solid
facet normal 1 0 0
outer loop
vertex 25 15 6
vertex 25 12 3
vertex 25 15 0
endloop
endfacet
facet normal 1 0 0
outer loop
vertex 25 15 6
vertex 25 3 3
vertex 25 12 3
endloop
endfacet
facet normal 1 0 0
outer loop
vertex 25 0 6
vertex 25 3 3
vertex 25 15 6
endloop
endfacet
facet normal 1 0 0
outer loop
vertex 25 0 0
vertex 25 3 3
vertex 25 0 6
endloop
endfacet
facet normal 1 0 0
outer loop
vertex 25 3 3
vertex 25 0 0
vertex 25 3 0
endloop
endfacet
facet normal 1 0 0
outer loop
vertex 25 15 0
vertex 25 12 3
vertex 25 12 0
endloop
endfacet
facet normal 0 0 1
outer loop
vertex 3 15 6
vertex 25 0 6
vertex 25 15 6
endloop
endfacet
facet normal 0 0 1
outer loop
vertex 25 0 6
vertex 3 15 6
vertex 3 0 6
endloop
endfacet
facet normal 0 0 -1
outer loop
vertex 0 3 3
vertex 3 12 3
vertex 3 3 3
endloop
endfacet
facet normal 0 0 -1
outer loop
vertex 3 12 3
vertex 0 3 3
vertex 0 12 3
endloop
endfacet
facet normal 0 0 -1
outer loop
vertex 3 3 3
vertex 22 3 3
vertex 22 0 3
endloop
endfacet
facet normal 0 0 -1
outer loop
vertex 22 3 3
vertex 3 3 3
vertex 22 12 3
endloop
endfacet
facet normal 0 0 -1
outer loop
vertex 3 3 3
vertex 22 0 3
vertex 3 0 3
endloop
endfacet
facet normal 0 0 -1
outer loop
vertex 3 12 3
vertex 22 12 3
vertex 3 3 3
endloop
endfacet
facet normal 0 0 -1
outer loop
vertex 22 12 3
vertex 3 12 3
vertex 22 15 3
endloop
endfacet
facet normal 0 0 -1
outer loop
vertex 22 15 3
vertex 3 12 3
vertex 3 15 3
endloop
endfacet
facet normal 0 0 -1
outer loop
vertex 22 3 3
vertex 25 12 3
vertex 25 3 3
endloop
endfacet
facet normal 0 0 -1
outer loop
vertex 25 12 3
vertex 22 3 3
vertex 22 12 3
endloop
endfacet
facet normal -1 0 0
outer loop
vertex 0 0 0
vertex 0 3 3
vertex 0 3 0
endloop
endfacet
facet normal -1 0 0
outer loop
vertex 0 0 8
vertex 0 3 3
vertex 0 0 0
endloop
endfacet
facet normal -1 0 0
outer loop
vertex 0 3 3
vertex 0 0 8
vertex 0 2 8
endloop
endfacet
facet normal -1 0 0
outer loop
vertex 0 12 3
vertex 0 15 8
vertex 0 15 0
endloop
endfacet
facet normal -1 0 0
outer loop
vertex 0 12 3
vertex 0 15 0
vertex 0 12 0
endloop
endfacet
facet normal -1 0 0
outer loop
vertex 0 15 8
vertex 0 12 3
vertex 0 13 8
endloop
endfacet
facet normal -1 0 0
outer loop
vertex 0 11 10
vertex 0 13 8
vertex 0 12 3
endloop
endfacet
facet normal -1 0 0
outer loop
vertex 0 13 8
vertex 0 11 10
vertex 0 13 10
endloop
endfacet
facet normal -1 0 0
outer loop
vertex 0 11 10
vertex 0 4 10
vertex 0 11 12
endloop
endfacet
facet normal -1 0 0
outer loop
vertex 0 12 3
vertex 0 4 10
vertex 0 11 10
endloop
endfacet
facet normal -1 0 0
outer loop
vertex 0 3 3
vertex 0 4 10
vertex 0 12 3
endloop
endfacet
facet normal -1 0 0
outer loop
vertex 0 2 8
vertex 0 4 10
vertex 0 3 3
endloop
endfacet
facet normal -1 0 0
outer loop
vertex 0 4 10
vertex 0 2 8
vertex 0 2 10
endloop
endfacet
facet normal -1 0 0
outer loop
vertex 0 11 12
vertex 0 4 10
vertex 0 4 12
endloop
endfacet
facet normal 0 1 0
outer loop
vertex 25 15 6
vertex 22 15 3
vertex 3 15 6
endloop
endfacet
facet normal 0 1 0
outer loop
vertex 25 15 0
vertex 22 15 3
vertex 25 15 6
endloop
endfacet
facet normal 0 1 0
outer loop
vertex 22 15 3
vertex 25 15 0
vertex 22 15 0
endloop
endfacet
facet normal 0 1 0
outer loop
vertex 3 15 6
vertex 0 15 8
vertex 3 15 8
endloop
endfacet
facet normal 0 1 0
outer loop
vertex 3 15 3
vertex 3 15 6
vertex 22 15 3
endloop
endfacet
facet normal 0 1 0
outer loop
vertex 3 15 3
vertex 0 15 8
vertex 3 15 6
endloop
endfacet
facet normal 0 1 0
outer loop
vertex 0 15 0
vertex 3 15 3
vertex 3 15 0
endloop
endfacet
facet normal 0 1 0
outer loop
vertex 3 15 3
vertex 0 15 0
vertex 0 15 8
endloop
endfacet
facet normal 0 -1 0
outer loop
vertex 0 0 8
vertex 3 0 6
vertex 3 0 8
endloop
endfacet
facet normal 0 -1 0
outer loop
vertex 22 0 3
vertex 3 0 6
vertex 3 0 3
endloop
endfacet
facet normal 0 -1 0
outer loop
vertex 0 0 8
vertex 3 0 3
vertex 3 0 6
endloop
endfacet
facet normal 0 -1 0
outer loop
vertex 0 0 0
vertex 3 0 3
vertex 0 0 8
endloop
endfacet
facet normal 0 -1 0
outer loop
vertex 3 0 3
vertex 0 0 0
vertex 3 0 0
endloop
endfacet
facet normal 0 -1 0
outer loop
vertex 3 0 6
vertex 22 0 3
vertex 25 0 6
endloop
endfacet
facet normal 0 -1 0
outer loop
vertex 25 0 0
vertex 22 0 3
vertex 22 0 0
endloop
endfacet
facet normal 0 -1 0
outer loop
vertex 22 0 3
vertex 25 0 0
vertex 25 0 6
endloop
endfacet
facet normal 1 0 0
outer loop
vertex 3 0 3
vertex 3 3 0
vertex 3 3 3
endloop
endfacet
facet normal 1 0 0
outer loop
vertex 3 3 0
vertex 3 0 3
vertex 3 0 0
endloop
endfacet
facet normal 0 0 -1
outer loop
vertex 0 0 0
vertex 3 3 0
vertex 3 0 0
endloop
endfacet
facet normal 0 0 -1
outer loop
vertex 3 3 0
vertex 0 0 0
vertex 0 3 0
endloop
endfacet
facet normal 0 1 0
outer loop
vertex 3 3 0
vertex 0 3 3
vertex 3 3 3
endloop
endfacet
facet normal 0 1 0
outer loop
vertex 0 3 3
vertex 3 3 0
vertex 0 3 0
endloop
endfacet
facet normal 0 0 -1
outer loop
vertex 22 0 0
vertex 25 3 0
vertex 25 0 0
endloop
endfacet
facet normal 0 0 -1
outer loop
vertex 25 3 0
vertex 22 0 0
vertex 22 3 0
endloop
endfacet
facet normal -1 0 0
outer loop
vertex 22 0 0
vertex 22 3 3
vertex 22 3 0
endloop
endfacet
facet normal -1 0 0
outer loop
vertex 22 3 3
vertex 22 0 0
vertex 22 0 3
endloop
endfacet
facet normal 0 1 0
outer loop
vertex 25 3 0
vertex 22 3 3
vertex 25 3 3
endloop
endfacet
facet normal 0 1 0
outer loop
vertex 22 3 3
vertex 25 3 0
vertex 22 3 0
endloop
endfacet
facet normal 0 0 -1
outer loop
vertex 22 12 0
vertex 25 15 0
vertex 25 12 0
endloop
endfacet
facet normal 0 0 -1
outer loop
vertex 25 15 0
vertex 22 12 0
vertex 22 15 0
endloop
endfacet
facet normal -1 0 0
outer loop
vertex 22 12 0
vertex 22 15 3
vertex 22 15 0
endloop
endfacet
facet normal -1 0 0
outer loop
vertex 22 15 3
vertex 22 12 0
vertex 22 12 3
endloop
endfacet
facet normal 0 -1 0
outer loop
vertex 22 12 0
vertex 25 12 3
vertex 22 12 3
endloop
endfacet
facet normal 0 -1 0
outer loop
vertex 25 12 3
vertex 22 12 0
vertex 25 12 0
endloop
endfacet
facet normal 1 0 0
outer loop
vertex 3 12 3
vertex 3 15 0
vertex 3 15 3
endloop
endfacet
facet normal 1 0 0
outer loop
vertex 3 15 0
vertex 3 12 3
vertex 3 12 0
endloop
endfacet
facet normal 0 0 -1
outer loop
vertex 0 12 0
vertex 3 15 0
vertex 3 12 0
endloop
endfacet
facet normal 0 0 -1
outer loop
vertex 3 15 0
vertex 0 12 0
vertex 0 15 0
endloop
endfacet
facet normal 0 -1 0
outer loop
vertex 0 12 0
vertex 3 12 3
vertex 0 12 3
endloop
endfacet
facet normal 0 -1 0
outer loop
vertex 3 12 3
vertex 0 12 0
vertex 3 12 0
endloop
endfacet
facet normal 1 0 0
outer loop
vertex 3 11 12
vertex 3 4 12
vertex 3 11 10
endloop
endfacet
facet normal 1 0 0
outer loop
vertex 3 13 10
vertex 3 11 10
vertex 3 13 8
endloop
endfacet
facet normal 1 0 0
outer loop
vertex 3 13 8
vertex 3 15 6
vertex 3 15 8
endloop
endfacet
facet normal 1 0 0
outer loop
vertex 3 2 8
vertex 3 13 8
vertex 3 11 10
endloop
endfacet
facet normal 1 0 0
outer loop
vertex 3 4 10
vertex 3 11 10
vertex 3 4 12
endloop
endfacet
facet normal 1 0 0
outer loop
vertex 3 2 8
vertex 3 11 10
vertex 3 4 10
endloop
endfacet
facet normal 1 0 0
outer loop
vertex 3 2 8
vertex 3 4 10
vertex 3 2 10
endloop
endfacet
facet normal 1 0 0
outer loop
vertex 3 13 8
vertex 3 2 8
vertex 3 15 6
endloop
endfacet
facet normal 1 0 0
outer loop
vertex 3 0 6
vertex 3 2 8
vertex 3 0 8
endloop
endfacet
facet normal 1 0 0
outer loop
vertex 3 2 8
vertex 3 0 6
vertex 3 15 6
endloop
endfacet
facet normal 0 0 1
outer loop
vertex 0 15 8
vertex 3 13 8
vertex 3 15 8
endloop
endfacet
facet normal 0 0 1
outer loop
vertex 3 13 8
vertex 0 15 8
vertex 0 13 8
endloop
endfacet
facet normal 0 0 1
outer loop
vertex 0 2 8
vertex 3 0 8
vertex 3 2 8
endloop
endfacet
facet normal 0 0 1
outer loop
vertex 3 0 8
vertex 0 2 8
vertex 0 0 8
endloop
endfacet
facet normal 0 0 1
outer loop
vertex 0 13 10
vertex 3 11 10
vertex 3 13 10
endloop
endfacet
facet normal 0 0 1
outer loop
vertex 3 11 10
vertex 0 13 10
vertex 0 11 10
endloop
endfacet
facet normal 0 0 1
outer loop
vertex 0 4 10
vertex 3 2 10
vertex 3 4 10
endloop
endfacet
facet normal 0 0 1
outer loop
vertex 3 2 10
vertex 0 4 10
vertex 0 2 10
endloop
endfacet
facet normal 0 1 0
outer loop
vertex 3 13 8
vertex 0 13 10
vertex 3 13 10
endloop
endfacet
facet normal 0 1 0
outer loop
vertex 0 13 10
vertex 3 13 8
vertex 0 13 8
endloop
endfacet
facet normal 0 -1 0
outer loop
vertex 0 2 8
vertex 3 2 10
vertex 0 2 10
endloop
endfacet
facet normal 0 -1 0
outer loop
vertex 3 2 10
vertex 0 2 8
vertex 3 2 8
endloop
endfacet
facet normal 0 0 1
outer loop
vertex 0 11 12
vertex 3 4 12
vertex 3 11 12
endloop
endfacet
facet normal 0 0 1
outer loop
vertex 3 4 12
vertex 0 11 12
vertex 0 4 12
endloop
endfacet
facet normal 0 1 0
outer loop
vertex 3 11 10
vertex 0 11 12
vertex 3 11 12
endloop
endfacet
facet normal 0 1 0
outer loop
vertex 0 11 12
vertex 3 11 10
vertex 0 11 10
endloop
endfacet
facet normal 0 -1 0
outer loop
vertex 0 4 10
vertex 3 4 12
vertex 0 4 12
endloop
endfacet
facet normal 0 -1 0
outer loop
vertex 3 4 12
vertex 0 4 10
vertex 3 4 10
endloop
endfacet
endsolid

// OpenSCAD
translate([0,0,3])cube([25,15,3]);
cube([3,3,6]);
translate([22,0,0])cube([3,3,6]);
translate([22,12,0])cube([3,3,6]);
translate([0,12,0])cube([3,3,6]);
translate([0,0,6])cube([3,15,2]);
translate([0,2,8])cube([3,11,2]);
translate([0,4,10])cube([3,7,2]);
